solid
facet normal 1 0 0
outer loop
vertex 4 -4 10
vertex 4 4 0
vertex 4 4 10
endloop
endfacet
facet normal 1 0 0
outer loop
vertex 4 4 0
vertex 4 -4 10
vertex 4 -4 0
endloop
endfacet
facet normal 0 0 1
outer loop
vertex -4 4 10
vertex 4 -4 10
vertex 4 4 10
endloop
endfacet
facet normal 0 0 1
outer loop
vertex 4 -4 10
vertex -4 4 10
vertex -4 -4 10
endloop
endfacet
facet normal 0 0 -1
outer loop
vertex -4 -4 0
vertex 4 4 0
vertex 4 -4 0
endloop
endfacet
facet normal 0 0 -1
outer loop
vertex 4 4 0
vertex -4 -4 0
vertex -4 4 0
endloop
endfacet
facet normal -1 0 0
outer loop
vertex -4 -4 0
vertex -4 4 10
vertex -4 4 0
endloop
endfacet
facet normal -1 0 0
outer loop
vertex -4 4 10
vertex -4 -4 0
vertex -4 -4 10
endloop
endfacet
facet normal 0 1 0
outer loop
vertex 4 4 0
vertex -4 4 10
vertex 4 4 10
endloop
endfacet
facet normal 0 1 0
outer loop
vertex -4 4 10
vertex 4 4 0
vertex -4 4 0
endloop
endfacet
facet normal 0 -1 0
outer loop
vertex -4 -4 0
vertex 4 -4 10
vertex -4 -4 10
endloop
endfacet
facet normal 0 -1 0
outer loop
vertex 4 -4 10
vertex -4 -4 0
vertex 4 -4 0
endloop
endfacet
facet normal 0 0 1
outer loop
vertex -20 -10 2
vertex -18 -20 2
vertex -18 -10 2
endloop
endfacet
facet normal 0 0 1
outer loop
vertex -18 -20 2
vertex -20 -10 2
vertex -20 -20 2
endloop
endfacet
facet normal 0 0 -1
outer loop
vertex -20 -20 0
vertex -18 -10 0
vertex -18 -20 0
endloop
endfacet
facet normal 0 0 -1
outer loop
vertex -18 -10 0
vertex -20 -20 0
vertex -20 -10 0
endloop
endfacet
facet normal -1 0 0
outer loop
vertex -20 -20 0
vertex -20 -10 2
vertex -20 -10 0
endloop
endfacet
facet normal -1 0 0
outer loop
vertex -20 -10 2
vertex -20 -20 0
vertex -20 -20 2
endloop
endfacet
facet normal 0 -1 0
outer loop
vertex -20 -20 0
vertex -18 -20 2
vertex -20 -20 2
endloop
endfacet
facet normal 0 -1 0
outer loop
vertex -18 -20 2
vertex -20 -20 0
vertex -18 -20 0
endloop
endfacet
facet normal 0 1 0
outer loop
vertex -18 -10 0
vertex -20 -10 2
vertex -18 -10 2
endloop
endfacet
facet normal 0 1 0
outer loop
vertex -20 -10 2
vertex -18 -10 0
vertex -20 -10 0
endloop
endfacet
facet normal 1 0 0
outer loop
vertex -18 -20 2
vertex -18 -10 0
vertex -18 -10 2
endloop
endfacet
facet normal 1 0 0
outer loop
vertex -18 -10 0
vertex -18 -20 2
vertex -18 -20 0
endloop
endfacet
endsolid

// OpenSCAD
translate([0, 0, 5]) color([0,1,0,0.9]) cube([8, 8, 10], center=true);
translate([-19.75, -19.75, 1]) color([1,0,0]) cube([0.5, 0.5, 2], center=true);
translate([-19.75, -19.25, 1]) color([1,0,0]) cube([0.5, 0.5, 2], center=true);
translate([-19.75, -18.75, 1]) color([1,0,0]) cube([0.5, 0.5, 2], center=true);
translate([-19.75, -18.25, 1]) color([1,0,0]) cube([0.5, 0.5, 2], center=true);
translate([-19.75, -17.75, 1]) color([1,0,0]) cube([0.5, 0.5, 2], center=true);
translate([-19.75, -17.25, 1]) color([1,0,0]) cube([0.5, 0.5, 2], center=true);
translate([-19.75, -16.75, 1]) color([1,0,0]) cube([0.5, 0.5, 2], center=true);
translate([-19.75, -16.25, 1]) color([1,0,0]) cube([0.5, 0.5, 2], center=true);
translate([-19.75, -15.75, 1]) color([1,0,0]) cube([0.5, 0.5, 2], center=true);
translate([-19.75, -15.25, 1]) color([1,0,0]) cube([0.5, 0.5, 2], center=true);
translate([-19.75, -14.75, 1]) color([1,0,0]) cube([0.5, 0.5, 2], center=true);
translate([-19.75, -14.25, 1]) color([1,0,0]) cube([0.5, 0.5, 2], center=true);
translate([-19.75, -13.75, 1]) color([1,0,0]) cube([0.5, 0.5, 2], center=true);
translate([-19.75, -13.25, 1]) color([1,0,0]) cube([0.5, 0.5, 2], center=true);
translate([-19.75, -12.75, 1]) color([1,0,0]) cube([0.5, 0.5, 2], center=true);
translate([-19.75, -12.25, 1]) color([1,0,0]) cube([0.5, 0.5, 2], center=true);
translate([-19.75, -11.75, 1]) color([1,0,0]) cube([0.5, 0.5, 2], center=true);
translate([-19.75, -11.25, 1]) color([1,0,0]) cube([0.5, 0.5, 2], center=true);
translate([-19.75, -10.75, 1]) color([1,0,0]) cube([0.5, 0.5, 2], center=true);
translate([-19.75, -10.25, 1]) color([1,0,0]) cube([0.5, 0.5, 2], center=true);
translate([-19.25, -19.75, 1]) color([1,0,0]) cube([0.5, 0.5, 2], center=true);
translate([-19.25, -19.25, 1]) color([1,0,0]) cube([0.5, 0.5, 2], center=true);
translate([-19.25, -18.75, 1]) color([1,0,0]) cube([0.5, 0.5, 2], center=true);
translate([-19.25, -18.25, 1]) color([1,0,0]) cube([0.5, 0.5, 2], center=true);
translate([-19.25, -17.75, 1]) color([1,0,0]) cube([0.5, 0.5, 2], center=true);
translate([-19.25, -17.25, 1]) color([1,0,0]) cube([0.5, 0.5, 2], center=true);
translate([-19.25, -16.75, 1]) color([1,0,0]) cube([0.5, 0.5, 2], center=true);
translate([-19.25, -16.25, 1]) color([1,0,0]) cube([0.5, 0.5, 2], center=true);
translate([-19.25, -15.75, 1]) color([1,0,0]) cube([0.5, 0.5, 2], center=true);
translate([-19.25, -15.25, 1]) color([1,0,0]) cube([0.5, 0.5, 2], center=true);
translate([-19.25, -14.75, 1]) color([1,0,0]) cube([0.5, 0.5, 2], center=true);
translate([-19.25, -14.25, 1]) color([1,0,0]) cube([0.5, 0.5, 2], center=true);
translate([-19.25, -13.75, 1]) color([1,0,0]) cube([0.5, 0.5, 2], center=true);
translate([-19.25, -13.25, 1]) color([1,0,0]) cube([0.5, 0.5, 2], center=true);
translate([-19.25, -12.75, 1]) color([1,0,0]) cube([0.5, 0.5, 2], center=true);
translate([-19.25, -12.25, 1]) color([1,0,0]) cube([0.5, 0.5, 2], center=true);
translate([-19.25, -11.75, 1]) color([1,0,0]) cube([0.5, 0.5, 2], center=true);
translate([-19.25, -11.25, 1]) color([1,0,0]) cube([0.5, 0.5, 2], center=true);
translate([-19.25, -10.75, 1]) color([1,0,0]) cube([0.5, 0.5, 2], center=true);
translate([-19.25, -10.25, 1]) color([1,0,0]) cube([0.5, 0.5, 2], center=true);
translate([-18.75, -19.75, 1]) color([1,0,0]) cube([0.5, 0.5, 2], center=true);
translate([-18.75, -19.25, 1]) color([1,0,0]) cube([0.5, 0.5, 2], center=true);
translate([-18.75, -18.75, 1]) color([1,0,0]) cube([0.5, 0.5, 2], center=true);
translate([-18.75, -18.25, 1]) color([1,0,0]) cube([0.5, 0.5, 2], center=true);
translate([-18.75, -17.75, 1]) color([1,0,0]) cube([0.5, 0.5, 2], center=true);
translate([-18.75, -17.25, 1]) color([1,0,0]) cube([0.5, 0.5, 2], center=true);
translate([-18.75, -16.75, 1]) color([1,0,0]) cube([0.5, 0.5, 2], center=true);
translate([-18.75, -16.25, 1]) color([1,0,0]) cube([0.5, 0.5, 2], center=true);
translate([-18.75, -15.75, 1]) color([1,0,0]) cube([0.5, 0.5, 2], center=true);
translate([-18.75, -15.25, 1]) color([1,0,0]) cube([0.5, 0.5, 2], center=true);
translate([-18.75, -14.75, 1]) color([1,0,0]) cube([0.5, 0.5, 2], center=true);
translate([-18.75, -14.25, 1]) color([1,0,0]) cube([0.5, 0.5, 2], center=true);
translate([-18.75, -13.75, 1]) color([1,0,0]) cube([0.5, 0.5, 2], center=true);
translate([-18.75, -13.25, 1]) color([1,0,0]) cube([0.5, 0.5, 2], center=true);
translate([-18.75, -12.75, 1]) color([1,0,0]) cube([0.5, 0.5, 2], center=true);
translate([-18.75, -12.25, 1]) color([1,0,0]) cube([0.5, 0.5, 2], center=true);
translate([-18.75, -11.75, 1]) color([1,0,0]) cube([0.5, 0.5, 2], center=true);
translate([-18.75, -11.25, 1]) color([1,0,0]) cube([0.5, 0.5, 2], center=true);
translate([-18.75, -10.75, 1]) color([1,0,0]) cube([0.5, 0.5, 2], center=true);
translate([-18.75, -10.25, 1]) color([1,0,0]) cube([0.5, 0.5, 2], center=true);
translate([-18.25, -19.75, 1]) color([1,0,0]) cube([0.5, 0.5, 2], center=true);
translate([-18.25, -19.25, 1]) color([1,0,0]) cube([0.5, 0.5, 2], center=true);
translate([-18.25, -18.75, 1]) color([1,0,0]) cube([0.5, 0.5, 2], center=true);
translate([-18.25, -18.25, 1]) color([1,0,0]) cube([0.5, 0.5, 2], center=true);
translate([-18.25, -17.75, 1]) color([1,0,0]) cube([0.5, 0.5, 2], center=true);
translate([-18.25, -17.25, 1]) color([1,0,0]) cube([0.5, 0.5, 2], center=true);
translate([-18.25, -16.75, 1]) color([1,0,0]) cube([0.5, 0.5, 2], center=true);
translate([-18.25, -16.25, 1]) color([1,0,0]) cube([0.5, 0.5, 2], center=true);
translate([-18.25, -15.75, 1]) color([1,0,0]) cube([0.5, 0.5, 2], center=true);
translate([-18.25, -15.25, 1]) color([1,0,0]) cube([0.5, 0.5, 2], center=true);
translate([-18.25, -14.75, 1]) color([1,0,0]) cube([0.5, 0.5, 2], center=true);
translate([-18.25, -14.25, 1]) color([1,0,0]) cube([0.5, 0.5, 2], center=true);
translate([-18.25, -13.75, 1]) color([1,0,0]) cube([0.5, 0.5, 2], center=true);
translate([-18.25, -13.25, 1]) color([1,0,0]) cube([0.5, 0.5, 2], center=true);
translate([-18.25, -12.75, 1]) color([1,0,0]) cube([0.5, 0.5, 2], center=true);
translate([-18.25, -12.25, 1]) color([1,0,0]) cube([0.5, 0.5, 2], center=true);
translate([-18.25, -11.75, 1]) color([1,0,0]) cube([0.5, 0.5, 2], center=true);
translate([-18.25, -11.25, 1]) color([1,0,0]) cube([0.5, 0.5, 2], center=true);
translate([-18.25, -10.75, 1]) color([1,0,0]) cube([0.5, 0.5, 2], center=true);
translate([-18.25, -10.25, 1]) color([1,0,0]) cube([0.5, 0.5, 2], center=true);
